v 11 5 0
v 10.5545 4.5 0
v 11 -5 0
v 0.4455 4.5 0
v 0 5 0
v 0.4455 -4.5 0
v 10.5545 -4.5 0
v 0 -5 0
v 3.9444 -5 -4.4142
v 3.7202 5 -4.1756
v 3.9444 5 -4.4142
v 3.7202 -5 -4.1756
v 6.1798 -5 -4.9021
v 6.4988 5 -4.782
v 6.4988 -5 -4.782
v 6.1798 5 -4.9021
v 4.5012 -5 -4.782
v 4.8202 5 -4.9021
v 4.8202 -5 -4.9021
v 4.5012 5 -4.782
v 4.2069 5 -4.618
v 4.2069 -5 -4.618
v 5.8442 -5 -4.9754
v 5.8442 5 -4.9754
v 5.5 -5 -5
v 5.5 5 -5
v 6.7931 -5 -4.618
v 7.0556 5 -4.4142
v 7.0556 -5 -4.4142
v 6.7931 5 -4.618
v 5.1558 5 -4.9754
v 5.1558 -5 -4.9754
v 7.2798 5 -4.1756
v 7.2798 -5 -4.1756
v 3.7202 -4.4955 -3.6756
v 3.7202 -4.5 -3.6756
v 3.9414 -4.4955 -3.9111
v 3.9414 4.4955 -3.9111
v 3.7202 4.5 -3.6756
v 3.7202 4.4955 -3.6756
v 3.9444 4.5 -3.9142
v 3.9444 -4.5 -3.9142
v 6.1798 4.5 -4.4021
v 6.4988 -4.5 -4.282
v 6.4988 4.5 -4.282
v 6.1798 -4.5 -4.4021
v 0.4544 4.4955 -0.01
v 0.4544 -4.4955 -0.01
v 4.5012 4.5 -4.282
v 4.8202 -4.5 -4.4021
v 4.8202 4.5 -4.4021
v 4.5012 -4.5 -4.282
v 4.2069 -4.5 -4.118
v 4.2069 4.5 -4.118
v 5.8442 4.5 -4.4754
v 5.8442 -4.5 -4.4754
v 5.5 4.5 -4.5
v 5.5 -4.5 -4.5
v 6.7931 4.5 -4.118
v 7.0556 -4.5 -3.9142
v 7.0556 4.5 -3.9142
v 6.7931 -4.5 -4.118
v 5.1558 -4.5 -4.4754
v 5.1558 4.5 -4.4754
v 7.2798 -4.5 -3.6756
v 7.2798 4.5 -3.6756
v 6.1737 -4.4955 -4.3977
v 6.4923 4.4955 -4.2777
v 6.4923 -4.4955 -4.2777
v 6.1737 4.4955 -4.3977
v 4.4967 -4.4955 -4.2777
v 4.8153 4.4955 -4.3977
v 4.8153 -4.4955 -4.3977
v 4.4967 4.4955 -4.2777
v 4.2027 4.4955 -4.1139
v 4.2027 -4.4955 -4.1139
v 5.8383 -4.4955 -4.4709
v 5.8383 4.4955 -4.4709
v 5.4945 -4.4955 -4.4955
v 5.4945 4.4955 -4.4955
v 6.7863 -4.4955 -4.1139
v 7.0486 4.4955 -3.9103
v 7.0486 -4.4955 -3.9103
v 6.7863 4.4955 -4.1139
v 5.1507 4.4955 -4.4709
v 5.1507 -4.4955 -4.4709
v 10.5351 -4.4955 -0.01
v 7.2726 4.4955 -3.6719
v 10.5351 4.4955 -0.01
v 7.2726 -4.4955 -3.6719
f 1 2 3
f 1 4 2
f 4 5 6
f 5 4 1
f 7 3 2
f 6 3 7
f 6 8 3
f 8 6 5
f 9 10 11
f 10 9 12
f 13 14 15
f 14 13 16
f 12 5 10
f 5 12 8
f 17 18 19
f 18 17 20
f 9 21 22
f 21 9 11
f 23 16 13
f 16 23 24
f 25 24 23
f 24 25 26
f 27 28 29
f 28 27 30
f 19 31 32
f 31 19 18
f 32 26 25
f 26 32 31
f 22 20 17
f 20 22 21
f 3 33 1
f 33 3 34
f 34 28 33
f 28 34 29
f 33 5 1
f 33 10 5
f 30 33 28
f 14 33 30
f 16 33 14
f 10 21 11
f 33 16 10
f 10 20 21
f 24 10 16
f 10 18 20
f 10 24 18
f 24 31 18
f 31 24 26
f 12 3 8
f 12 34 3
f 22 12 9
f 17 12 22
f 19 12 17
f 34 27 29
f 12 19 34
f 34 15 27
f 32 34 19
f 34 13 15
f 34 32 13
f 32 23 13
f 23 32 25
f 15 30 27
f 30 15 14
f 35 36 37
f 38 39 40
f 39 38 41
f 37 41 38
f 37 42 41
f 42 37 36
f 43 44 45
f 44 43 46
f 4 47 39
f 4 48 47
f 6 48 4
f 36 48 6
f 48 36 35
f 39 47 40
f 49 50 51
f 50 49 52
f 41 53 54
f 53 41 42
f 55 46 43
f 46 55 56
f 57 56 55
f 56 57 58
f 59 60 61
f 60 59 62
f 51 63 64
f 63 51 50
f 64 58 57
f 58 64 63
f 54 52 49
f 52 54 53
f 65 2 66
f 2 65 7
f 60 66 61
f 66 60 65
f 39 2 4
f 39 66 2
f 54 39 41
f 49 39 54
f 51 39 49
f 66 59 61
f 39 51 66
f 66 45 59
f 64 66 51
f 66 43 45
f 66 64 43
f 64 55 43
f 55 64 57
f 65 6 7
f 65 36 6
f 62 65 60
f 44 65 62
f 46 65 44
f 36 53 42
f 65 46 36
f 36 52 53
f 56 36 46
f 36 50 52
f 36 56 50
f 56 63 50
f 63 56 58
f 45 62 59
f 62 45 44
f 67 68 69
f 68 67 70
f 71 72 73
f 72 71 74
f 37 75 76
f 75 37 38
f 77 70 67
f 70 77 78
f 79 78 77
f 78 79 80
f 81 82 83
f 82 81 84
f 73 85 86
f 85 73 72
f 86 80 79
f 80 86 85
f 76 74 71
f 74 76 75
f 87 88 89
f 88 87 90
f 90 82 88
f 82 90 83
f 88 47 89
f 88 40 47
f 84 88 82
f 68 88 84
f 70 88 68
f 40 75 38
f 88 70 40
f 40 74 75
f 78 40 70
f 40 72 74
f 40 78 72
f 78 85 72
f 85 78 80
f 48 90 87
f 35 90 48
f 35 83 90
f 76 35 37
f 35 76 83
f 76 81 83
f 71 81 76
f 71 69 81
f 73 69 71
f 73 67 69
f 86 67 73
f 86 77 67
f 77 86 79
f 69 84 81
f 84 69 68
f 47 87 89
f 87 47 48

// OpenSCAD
//A simple animation of a bucket, through emptying, this could be used for an animation of a water wheel of for construction equipent or something else

$fn = 40;
angle = 45 * $t;
size = [11,10,5];

bucketFilled(size, angle);

module bucketFilled(size, angle){
    
    color("blue")
    rotate([0,angle,0])
    resize(size)
    difference(){  
        bucketShape();
        translate([0,0,0.5])
        resize([0,9,0])
        bucketShape();
    }
    
    color("aqua", alpha=0.6)
    difference(){
        //water
        scale([0.999,0.999,0.999]) //prevents discolouration due to z-fighting
        rotate([0,angle,0])
        difference(){
            resize(size - [0,1,0])
            translate([0,0,0.5])
            resize([0,9,0])
            bucketShape();    
            translate([0,(size * -[0,0.5,0]), 0.001])
            cube(size);
        }
            
        //water leveller
        lipLevel = ((size * -[1,0,0]) + 0.5) * sin(angle) - 0.01 ;       
        translate([0,(size * -[0,0.5,0]) + 0.4, lipLevel])
        cube(size + [1,-0.8,100]);
    }
}



module bucket(size){
    resize(size) 
    difference(){  
        bucketShape();
        translate([0,0,0.5])
        resize([0,9,0])
        bucketShape();
    }
}


module bucketShape(){
    translate([0,5,0])
    rotate([90,0,0])
    hull() {
        linear_extrude(10)
        polygon(points=[[0,0],[10,0],[5,-2]]);
        translate([5,-3])
        cylinder(d=4,h=10);
    }
}
